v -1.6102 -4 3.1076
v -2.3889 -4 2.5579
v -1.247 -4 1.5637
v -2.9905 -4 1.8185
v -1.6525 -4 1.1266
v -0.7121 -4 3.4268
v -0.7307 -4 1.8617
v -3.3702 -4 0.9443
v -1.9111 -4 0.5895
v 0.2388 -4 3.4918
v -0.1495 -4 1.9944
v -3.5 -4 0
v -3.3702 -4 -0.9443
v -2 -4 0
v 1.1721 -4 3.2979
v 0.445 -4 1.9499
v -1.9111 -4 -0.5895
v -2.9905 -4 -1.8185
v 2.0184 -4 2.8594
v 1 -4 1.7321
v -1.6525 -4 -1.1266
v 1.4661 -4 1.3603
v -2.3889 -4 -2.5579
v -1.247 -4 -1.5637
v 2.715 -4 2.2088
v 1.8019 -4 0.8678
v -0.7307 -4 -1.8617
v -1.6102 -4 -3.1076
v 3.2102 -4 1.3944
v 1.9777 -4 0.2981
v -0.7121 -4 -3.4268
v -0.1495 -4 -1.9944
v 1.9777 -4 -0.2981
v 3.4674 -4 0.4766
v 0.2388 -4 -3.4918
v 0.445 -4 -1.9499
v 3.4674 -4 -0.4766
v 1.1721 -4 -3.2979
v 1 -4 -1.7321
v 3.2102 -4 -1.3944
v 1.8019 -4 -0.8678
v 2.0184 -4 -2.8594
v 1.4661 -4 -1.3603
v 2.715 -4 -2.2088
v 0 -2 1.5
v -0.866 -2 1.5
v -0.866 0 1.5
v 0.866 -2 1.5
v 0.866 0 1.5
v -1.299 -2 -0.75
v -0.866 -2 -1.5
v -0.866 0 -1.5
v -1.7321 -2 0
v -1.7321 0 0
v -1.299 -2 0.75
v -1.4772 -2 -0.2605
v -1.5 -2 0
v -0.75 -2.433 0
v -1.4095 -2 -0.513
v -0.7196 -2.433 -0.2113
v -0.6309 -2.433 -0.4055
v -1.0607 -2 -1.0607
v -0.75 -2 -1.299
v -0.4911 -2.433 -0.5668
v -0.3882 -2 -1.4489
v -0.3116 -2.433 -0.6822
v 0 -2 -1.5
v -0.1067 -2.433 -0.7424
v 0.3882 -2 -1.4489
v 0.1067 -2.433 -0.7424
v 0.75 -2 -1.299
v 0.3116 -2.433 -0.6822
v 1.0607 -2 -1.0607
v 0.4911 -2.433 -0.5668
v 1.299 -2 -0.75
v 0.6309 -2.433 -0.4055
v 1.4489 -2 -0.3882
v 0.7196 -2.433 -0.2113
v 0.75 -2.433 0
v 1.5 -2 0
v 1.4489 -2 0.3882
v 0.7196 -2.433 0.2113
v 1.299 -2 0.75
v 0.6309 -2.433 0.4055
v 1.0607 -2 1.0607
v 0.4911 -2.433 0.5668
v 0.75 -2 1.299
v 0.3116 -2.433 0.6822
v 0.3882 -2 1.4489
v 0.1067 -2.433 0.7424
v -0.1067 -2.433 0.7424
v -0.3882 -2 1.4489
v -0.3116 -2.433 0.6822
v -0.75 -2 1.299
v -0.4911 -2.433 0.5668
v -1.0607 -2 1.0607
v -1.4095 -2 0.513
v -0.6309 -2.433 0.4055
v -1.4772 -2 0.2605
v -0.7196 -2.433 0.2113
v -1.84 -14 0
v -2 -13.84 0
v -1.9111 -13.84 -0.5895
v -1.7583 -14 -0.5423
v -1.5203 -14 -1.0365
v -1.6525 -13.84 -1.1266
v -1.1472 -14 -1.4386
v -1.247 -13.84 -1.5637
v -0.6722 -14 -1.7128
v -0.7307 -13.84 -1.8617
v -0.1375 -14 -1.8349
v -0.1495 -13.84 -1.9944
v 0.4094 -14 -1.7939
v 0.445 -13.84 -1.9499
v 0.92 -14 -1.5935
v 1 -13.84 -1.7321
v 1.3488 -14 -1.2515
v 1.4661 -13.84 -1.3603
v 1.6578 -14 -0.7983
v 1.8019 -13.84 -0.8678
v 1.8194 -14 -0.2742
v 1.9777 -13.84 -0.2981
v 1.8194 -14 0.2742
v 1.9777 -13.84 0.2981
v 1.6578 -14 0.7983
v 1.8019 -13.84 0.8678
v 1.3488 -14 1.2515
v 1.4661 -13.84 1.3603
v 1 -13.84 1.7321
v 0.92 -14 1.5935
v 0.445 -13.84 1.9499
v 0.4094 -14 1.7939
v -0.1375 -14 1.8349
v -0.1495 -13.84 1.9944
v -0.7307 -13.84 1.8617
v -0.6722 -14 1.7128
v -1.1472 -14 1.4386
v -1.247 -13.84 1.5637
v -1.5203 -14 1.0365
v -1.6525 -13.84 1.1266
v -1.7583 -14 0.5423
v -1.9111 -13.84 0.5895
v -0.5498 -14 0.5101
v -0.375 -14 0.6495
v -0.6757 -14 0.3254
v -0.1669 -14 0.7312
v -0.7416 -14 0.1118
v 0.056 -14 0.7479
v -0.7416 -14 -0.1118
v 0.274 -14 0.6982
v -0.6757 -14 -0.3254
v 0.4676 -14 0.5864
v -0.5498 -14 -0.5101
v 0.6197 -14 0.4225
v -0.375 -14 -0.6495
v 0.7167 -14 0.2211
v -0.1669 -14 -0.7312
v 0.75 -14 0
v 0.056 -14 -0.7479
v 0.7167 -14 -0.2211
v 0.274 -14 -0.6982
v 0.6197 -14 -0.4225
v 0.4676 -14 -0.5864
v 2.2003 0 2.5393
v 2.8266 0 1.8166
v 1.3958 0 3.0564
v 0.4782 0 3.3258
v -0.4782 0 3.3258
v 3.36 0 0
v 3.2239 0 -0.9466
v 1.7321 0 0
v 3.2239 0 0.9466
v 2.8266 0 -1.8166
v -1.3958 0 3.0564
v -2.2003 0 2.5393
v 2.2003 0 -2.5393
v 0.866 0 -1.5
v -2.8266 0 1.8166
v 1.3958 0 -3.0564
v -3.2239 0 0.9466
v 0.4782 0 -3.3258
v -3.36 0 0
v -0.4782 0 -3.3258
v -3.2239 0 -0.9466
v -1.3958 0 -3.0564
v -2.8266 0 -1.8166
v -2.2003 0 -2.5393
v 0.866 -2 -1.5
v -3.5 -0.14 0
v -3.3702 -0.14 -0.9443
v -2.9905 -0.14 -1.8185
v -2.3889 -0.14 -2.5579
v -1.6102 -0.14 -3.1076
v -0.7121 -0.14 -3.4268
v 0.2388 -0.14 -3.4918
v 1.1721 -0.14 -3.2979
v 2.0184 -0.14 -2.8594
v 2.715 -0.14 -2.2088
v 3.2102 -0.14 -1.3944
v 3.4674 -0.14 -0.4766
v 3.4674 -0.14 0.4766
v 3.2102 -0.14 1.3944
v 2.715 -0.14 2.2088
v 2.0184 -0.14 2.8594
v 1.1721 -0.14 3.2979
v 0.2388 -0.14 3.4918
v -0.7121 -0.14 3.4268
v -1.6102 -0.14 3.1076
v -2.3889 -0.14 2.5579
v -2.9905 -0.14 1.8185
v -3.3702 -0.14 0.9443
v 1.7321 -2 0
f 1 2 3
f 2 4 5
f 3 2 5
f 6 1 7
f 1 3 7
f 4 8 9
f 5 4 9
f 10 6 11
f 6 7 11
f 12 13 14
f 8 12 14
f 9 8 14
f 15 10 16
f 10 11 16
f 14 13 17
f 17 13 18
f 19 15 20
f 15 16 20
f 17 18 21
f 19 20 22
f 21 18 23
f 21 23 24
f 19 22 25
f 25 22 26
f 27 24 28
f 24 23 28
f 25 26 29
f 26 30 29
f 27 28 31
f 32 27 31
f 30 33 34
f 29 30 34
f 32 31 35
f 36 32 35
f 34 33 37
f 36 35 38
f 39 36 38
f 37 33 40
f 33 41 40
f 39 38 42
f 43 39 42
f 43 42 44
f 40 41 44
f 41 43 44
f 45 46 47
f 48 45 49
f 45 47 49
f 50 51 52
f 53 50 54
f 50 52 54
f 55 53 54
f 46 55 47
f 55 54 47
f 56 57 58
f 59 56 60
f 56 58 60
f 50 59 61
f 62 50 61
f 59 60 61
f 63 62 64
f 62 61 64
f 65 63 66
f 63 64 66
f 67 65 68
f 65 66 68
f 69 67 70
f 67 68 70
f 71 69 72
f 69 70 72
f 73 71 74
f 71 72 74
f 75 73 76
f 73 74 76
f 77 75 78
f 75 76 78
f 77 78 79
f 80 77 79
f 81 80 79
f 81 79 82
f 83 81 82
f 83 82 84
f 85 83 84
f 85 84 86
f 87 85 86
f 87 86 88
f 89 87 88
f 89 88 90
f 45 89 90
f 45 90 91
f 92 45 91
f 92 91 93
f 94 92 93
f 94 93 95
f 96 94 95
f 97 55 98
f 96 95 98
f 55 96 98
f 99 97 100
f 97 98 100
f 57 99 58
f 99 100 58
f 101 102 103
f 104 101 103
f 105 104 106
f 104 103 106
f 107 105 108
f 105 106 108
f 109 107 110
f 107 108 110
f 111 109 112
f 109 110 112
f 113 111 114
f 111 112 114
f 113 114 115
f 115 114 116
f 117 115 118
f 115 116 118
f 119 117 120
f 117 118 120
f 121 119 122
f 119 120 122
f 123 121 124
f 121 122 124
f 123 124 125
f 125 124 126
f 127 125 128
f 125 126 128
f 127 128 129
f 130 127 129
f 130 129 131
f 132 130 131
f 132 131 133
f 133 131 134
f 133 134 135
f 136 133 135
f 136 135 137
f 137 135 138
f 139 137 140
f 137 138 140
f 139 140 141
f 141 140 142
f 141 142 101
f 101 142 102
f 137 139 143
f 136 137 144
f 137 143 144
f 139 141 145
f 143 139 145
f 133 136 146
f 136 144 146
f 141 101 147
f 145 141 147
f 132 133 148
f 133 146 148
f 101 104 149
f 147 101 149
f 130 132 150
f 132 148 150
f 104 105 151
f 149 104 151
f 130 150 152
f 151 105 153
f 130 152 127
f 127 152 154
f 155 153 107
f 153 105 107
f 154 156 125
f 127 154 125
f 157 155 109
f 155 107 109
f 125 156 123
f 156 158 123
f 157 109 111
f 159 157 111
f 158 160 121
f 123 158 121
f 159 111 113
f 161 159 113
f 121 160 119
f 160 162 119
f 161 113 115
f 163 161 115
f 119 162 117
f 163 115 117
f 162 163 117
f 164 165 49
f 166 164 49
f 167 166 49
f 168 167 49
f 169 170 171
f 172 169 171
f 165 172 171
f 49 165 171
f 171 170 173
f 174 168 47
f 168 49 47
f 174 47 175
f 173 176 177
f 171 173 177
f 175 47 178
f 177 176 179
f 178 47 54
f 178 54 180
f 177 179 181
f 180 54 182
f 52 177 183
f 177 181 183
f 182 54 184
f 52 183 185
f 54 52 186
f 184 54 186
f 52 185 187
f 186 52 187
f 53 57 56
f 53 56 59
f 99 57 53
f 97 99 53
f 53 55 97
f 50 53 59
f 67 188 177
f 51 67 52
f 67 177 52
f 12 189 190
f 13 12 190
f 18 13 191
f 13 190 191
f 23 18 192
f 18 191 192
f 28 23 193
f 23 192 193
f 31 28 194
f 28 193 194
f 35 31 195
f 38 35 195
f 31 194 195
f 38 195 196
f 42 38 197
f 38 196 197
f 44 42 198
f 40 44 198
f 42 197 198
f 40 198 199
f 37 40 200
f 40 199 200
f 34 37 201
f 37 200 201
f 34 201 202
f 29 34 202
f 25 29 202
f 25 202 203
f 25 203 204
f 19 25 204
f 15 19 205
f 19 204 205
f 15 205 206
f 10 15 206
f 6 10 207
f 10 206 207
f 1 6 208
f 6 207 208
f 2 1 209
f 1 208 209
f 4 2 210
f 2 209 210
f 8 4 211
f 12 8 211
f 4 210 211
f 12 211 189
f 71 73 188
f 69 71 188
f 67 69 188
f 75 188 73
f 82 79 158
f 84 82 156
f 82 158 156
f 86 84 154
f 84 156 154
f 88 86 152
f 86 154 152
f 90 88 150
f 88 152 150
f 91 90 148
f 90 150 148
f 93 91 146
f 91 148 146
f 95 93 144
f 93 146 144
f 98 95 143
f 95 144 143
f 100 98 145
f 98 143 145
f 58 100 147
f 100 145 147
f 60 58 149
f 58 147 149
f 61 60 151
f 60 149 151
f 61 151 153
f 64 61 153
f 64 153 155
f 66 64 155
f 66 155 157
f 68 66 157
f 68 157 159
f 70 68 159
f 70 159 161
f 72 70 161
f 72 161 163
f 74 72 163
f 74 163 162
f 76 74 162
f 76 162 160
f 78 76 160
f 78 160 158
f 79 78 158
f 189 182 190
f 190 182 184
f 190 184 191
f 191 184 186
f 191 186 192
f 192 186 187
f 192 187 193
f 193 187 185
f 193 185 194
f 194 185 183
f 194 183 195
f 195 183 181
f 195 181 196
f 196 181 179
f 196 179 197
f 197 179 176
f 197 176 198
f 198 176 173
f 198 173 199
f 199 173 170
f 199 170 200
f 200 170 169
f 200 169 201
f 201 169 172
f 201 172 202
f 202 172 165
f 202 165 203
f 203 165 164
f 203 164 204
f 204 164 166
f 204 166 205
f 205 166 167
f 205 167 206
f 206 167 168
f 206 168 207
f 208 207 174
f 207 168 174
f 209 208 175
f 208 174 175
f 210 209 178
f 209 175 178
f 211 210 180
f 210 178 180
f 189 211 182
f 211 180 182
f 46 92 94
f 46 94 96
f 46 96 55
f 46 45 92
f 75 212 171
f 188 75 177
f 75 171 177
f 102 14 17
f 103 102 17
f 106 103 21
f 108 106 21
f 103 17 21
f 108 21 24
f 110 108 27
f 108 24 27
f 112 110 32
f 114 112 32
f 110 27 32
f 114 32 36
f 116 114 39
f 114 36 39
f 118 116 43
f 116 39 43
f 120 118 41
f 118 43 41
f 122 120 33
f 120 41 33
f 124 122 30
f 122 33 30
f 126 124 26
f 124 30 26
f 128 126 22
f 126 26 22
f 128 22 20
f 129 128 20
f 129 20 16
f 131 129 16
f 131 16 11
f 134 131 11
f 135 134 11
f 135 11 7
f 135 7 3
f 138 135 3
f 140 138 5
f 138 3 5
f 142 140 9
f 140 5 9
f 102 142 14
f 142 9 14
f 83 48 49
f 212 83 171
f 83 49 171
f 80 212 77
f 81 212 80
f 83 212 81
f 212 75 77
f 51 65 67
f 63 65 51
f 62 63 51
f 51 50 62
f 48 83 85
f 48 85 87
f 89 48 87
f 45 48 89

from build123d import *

# Parameters (mm, degrees)
CHAMFER_1_SIZE      = 0.16
CHAMFER_2_SIZE      = 0.14
CUT_EXTRUDE_1_DEPTH = 2
CUT_EXTRUDE_2_REACH = 16.849
SKETCH_4_R          = 0.75


with BuildPart() as part:
    # 草图2 → 旋转1 (revolve)
    with BuildSketch(Plane.XY):
        Polygon((-1.5, 0), (-1.5, -2), (0, -2.866025404), (0, -14), (-2, -14), (-2, -4), (-3.5, -4), (-3.5, 0), align=None)
    revolve(axis=Axis((0, -2.866025404, 0), (0, -1, 0)))

    # 倒角1
    chamfer_1_edges = [part.edges().sort_by_distance(p)[0] for p in [
        (2, -14, 0),
    ]]
    chamfer(chamfer_1_edges, length=CHAMFER_1_SIZE)

    # 倒角2
    chamfer_2_edges = [part.edges().sort_by_distance(p)[0] for p in [
        (3.5, 0, 0),
    ]]
    chamfer(chamfer_2_edges, length=CHAMFER_2_SIZE)

    # 草图3 → 切除-拉伸1 (cut)
    with BuildSketch(Plane(origin=(0, 0, 0), x_dir=(-1, 0, 0), z_dir=(0, 1, 0))):
        Polygon((-0.866025404, 1.5), (-1.732050808, 0), (-0.866025404, -1.5), (0.866025404, -1.5), (1.732050808, 0), (0.866025404, 1.5), align=None)
    extrude(amount=-CUT_EXTRUDE_1_DEPTH, mode=Mode.SUBTRACT)

    # 切除-拉伸2: up to this cone (the profile starts outside it)
    cut_extrude_2_end = Plane(origin=(0, -14, 0), z_dir=(0, 1, 0)).offset(11.133975596) * Cone(1.732e-06, 10.76473977, 6.215024404, align=(Align.CENTER, Align.CENTER, Align.MIN), mode=Mode.PRIVATE)
    # 草图4 → 切除-拉伸2 (cut, up to the surface)
    with BuildSketch(Plane.XZ.offset(14), mode=Mode.PRIVATE) as cut_extrude_2_sk1:
        Circle(SKETCH_4_R)
    cut_extrude_2_tool1 = extrude(cut_extrude_2_sk1.sketch, amount=-CUT_EXTRUDE_2_REACH, mode=Mode.PRIVATE) - cut_extrude_2_end
    add(cut_extrude_2_tool1.solids().sort_by_distance((0, -14, 0))[0], mode=Mode.SUBTRACT)


solid = part.part
